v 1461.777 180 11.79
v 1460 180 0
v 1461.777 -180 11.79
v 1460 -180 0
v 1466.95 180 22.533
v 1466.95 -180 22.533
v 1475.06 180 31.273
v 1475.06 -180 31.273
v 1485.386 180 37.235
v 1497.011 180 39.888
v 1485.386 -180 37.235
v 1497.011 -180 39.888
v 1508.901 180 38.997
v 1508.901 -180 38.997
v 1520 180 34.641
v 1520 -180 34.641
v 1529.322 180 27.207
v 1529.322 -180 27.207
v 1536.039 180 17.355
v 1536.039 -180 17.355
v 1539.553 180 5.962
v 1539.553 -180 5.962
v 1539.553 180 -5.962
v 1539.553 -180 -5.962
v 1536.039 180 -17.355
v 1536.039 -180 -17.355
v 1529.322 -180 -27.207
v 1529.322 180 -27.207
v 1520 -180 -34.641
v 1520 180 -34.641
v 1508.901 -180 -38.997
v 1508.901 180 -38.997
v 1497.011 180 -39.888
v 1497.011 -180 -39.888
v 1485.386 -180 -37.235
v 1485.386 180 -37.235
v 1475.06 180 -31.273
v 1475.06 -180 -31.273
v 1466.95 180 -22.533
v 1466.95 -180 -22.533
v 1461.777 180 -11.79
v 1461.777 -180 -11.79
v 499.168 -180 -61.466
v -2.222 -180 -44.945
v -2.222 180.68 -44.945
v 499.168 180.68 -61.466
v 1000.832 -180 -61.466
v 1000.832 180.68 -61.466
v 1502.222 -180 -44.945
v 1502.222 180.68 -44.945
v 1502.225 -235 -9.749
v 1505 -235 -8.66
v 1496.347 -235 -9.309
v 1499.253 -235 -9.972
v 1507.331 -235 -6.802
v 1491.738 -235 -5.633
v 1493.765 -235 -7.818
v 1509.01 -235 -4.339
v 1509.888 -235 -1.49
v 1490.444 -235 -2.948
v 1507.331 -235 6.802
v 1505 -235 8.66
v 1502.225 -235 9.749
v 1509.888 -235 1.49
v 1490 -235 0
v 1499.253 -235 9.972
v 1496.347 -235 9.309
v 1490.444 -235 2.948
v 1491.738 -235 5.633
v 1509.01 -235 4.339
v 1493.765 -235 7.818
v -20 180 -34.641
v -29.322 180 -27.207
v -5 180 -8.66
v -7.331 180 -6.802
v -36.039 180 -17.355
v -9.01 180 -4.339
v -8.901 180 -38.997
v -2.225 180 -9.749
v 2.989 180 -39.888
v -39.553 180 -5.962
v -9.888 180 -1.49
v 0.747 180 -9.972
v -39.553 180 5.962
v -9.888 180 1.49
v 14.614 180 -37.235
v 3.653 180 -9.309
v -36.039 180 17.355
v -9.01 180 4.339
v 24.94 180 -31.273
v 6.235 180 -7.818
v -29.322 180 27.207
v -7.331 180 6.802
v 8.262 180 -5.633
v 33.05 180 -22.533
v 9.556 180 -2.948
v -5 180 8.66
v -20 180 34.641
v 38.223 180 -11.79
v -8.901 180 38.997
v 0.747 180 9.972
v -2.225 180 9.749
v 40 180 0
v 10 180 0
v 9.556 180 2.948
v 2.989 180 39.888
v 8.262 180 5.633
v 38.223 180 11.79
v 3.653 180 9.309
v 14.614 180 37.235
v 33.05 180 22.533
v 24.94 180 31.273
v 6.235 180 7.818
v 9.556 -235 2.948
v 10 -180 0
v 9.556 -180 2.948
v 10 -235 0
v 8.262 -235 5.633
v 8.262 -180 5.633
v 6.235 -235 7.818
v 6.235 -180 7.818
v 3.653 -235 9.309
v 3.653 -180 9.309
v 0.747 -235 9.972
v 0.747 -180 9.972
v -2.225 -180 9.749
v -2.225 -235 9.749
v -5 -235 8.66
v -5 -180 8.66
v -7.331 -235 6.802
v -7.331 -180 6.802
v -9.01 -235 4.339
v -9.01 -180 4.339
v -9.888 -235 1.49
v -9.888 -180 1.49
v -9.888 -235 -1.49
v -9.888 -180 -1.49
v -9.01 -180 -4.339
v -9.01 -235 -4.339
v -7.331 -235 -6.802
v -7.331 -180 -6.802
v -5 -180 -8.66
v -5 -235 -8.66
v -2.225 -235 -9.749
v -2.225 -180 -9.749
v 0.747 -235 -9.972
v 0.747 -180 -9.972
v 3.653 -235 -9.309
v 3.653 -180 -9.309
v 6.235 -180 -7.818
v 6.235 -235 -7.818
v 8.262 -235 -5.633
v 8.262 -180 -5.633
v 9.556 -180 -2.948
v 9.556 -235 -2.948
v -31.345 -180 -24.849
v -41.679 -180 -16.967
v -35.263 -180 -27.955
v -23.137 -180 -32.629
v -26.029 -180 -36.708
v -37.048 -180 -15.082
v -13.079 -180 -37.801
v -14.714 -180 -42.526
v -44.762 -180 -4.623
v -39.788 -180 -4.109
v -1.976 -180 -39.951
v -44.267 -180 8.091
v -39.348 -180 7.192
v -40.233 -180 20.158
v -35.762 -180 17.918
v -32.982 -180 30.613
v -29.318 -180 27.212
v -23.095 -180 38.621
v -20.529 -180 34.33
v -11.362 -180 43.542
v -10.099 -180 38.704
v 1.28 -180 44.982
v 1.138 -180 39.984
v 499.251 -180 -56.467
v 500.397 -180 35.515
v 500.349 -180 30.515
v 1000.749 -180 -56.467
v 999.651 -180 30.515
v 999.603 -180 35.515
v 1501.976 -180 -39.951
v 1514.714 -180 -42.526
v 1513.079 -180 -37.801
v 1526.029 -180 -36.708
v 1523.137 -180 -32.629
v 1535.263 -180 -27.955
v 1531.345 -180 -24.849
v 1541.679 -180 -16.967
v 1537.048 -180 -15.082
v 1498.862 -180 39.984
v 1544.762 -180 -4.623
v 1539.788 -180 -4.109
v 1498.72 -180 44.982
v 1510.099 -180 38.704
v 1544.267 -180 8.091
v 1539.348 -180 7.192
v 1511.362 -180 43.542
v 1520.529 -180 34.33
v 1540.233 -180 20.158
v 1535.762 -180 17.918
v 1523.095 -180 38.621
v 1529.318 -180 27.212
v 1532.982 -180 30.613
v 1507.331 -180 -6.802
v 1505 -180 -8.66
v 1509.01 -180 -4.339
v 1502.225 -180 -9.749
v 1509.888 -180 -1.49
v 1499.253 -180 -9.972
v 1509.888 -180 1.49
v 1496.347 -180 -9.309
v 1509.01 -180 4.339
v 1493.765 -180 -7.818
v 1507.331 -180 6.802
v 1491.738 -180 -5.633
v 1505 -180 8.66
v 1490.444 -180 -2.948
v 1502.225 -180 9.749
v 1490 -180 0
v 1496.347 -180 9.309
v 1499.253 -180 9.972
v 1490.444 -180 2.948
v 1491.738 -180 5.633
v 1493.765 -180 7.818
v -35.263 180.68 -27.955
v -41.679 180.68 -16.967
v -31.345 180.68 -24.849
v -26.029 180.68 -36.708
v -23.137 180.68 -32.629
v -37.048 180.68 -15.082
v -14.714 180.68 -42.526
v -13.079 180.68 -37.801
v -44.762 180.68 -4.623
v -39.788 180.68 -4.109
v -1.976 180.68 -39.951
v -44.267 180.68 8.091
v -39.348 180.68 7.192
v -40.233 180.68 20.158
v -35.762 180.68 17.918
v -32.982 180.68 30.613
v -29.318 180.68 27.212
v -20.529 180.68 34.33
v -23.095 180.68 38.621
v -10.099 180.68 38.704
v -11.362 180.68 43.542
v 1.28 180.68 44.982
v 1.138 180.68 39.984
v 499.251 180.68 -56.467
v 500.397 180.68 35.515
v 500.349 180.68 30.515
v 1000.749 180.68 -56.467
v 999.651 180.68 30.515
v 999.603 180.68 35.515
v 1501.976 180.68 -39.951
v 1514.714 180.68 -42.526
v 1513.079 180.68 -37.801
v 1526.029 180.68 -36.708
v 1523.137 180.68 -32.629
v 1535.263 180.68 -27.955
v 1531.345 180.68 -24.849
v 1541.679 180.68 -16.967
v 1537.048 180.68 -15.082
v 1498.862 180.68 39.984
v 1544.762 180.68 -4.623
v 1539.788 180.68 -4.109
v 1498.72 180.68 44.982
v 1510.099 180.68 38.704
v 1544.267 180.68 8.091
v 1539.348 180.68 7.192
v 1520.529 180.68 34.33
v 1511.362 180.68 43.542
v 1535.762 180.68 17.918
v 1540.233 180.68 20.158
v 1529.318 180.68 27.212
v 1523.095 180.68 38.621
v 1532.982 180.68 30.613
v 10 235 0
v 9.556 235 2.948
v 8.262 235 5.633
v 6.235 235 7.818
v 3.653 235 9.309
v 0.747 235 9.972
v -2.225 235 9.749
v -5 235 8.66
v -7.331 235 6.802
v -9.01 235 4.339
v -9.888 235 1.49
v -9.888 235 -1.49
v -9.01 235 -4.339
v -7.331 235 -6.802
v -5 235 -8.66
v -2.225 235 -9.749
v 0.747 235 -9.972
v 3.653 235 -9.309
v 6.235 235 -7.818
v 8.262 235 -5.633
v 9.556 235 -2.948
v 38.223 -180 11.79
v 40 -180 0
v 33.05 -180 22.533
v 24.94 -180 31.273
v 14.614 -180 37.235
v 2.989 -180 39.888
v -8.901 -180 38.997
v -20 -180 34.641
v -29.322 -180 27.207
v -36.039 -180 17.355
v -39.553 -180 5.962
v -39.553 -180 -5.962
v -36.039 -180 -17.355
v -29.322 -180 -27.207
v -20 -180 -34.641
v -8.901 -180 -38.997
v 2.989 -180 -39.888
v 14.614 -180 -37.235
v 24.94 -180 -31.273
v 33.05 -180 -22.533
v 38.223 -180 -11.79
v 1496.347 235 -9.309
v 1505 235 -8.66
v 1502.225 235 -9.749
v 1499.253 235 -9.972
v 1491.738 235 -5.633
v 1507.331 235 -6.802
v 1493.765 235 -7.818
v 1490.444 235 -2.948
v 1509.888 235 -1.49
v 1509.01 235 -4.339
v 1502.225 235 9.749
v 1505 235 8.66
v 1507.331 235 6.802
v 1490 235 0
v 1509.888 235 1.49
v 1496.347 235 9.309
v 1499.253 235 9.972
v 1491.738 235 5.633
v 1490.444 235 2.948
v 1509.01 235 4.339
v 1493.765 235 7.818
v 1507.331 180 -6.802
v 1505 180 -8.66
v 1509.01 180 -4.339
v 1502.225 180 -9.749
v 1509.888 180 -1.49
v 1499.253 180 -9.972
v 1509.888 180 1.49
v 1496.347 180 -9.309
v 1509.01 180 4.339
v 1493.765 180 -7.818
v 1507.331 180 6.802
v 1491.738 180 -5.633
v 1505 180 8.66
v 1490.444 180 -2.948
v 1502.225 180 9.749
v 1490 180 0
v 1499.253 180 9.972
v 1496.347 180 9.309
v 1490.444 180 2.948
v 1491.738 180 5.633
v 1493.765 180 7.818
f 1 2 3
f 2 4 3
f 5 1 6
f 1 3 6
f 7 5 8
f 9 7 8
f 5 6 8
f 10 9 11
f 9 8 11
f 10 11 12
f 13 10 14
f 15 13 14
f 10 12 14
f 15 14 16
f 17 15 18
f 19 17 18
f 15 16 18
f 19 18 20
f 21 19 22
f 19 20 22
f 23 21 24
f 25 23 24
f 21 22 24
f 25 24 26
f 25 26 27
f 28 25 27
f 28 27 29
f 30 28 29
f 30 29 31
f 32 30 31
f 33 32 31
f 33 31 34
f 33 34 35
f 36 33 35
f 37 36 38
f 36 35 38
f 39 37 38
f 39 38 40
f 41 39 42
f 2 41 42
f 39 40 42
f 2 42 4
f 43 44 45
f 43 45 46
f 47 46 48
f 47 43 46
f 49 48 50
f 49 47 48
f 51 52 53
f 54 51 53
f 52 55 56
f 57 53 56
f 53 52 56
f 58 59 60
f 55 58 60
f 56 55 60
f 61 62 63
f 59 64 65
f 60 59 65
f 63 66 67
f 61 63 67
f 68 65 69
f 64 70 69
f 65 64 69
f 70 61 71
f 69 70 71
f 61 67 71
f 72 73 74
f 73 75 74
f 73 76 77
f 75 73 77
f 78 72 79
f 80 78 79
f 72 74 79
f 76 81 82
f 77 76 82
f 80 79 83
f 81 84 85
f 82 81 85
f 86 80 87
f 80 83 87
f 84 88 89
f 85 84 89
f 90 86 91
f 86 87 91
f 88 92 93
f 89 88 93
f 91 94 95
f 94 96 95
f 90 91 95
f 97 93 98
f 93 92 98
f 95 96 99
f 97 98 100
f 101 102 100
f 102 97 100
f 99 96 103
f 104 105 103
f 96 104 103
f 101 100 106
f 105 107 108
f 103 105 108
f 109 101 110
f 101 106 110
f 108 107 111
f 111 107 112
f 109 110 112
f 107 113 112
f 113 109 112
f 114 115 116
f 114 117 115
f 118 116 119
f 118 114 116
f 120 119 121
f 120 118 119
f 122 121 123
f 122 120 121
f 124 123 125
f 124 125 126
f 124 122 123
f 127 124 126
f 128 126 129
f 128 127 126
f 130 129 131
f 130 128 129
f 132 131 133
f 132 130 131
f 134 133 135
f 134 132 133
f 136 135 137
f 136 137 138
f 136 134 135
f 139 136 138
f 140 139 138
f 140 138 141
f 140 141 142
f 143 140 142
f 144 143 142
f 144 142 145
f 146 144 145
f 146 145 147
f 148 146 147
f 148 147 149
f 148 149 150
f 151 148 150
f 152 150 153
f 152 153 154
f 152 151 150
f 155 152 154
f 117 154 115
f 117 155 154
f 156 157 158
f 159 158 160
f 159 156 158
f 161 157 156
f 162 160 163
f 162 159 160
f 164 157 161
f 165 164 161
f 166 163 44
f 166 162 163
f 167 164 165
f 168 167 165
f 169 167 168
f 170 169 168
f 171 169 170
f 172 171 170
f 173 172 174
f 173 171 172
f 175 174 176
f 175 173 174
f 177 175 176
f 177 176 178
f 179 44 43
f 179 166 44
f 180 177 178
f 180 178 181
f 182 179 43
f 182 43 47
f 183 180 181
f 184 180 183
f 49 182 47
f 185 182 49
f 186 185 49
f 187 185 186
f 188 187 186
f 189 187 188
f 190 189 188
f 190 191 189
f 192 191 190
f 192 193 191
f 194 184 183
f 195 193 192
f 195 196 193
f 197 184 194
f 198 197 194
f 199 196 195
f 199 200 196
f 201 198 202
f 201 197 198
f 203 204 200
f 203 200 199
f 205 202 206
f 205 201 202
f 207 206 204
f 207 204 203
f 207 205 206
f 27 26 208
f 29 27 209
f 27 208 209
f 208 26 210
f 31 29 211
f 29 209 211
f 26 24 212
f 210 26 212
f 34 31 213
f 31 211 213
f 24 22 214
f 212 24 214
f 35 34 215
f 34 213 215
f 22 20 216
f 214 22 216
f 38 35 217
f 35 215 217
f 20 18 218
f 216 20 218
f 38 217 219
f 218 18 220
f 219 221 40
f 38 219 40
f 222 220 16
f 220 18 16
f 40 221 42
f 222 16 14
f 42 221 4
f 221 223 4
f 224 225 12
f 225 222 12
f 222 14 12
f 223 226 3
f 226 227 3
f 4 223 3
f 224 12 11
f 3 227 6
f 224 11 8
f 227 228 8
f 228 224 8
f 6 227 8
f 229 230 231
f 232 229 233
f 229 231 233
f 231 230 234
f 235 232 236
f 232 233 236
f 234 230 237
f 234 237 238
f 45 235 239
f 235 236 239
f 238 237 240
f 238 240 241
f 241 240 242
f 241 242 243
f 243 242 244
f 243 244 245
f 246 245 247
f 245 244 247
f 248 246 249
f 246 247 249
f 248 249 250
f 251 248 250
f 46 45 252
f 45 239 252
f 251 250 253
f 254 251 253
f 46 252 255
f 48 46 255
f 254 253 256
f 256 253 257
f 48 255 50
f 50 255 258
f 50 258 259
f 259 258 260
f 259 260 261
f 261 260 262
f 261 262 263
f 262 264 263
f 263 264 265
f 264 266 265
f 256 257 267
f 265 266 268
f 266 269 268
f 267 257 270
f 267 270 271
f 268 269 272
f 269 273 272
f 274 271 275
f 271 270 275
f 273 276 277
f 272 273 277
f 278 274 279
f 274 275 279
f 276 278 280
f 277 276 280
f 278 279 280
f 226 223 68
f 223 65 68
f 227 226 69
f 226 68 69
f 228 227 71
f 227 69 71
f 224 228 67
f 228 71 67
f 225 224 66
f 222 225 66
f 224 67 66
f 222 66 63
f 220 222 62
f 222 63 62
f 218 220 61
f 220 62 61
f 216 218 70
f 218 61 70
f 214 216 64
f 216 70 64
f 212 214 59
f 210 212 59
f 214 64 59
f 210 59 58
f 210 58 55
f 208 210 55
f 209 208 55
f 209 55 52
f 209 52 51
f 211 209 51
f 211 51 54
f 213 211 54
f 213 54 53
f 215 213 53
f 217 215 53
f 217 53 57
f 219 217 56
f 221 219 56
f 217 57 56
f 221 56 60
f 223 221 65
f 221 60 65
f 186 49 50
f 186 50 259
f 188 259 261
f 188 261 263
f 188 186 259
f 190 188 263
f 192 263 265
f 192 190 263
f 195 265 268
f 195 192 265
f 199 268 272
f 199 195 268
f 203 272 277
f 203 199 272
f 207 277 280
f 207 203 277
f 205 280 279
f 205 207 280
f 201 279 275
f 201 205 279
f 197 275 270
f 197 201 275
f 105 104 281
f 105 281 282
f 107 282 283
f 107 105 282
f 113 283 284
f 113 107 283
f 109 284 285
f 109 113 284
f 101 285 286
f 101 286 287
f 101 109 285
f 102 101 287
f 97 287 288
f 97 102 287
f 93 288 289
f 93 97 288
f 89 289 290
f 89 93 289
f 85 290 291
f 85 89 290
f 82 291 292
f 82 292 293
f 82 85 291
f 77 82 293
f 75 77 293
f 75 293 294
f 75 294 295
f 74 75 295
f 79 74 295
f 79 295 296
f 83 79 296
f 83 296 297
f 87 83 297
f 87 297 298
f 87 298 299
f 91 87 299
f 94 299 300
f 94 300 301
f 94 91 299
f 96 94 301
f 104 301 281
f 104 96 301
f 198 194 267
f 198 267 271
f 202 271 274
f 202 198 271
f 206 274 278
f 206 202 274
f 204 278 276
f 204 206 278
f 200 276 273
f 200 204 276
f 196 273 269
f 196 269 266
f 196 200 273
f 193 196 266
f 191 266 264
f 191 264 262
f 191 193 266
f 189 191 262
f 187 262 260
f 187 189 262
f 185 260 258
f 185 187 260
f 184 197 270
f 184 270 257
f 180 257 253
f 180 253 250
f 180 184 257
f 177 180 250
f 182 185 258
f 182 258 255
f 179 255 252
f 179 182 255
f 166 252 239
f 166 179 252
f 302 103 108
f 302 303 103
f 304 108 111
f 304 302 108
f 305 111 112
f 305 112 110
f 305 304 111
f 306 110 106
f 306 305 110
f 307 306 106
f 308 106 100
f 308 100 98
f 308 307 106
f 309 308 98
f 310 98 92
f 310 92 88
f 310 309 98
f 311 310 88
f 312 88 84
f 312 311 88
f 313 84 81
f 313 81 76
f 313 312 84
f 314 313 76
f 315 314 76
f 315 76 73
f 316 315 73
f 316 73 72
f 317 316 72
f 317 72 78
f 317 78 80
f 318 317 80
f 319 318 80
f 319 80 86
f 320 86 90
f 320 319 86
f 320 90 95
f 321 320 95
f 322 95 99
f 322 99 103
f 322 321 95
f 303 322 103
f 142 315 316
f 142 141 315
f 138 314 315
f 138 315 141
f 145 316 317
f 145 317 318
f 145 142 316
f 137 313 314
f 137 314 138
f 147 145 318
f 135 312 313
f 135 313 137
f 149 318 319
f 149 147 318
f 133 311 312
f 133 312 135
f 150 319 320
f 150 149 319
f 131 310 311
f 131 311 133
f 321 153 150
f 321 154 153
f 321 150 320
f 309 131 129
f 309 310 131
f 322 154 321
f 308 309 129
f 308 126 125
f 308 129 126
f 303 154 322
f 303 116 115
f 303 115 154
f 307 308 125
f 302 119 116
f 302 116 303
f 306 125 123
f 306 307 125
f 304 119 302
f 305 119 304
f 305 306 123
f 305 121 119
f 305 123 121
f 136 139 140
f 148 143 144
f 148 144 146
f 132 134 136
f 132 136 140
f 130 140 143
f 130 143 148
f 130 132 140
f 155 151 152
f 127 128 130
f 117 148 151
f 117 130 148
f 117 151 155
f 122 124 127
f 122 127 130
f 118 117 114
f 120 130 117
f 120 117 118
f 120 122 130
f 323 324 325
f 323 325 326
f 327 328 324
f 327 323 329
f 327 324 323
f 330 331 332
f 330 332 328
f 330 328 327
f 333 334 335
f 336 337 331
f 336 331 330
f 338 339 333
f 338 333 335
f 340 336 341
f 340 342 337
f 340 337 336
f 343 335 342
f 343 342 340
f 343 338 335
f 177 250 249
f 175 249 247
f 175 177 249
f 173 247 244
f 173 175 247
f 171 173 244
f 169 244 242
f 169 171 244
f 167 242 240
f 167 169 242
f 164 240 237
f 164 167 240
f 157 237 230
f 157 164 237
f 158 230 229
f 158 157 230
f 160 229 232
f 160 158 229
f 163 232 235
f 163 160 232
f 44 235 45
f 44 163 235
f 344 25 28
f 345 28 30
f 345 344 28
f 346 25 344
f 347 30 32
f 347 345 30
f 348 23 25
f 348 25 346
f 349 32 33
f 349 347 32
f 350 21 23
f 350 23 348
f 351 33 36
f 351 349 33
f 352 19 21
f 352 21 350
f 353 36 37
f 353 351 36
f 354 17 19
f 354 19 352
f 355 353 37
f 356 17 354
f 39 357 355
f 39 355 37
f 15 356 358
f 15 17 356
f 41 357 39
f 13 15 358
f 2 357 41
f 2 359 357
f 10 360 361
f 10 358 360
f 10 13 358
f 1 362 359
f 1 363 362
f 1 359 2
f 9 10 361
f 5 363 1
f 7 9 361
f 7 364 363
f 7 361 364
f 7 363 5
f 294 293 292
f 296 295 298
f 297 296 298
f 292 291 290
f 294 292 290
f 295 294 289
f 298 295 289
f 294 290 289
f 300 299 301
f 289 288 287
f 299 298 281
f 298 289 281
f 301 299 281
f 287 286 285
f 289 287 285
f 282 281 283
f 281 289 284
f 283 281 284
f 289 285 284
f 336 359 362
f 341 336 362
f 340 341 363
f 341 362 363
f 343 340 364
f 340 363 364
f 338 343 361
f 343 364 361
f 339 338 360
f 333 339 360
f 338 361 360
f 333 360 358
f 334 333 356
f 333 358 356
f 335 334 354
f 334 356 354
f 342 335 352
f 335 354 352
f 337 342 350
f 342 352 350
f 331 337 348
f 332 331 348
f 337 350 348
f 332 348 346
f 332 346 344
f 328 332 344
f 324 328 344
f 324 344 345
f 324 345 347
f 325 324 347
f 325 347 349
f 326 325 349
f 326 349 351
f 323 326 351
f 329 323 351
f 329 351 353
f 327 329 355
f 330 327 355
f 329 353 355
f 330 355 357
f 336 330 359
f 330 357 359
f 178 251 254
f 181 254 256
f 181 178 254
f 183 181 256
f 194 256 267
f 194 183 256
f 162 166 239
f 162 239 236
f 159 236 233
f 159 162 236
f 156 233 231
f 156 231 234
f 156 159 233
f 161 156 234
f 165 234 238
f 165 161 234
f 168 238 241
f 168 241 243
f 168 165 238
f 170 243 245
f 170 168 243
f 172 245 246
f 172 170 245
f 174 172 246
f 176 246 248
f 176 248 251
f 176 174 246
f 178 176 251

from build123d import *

# Parameters (mm, degrees)
F0_R     = 10
F1_DEPTH = 235
F2_R     = 40
F3_DEPTH = 180
F8_DEPTH = 360.68


with BuildPart() as f1:
    # F0 (on Front) → F1 (new body, symmetric)
    with BuildSketch(Plane.XZ):
        Circle(F0_R)
    extrude(amount=F1_DEPTH, both=True)

    # F2 (on Front) → F3 (join, symmetric)
    with BuildSketch(Plane.XZ):
        Circle(F2_R)
    extrude(amount=F3_DEPTH, both=True)


with BuildPart() as f5_1:
    # F5: instance of F1
    add(f1.part.mirror(Plane.YZ.offset(750)))


with BuildPart() as f8:
    # F7 (on offset) → F8 (new body)
    with BuildSketch(Plane.XZ.offset(180)):
        with BuildLine():
            ThreePointArc((1498.720032, 44.981793), (750, 34.331439), (1.279968, 44.981793))
            ThreePointArc((1.279968, 44.981793), (-44.965908, 1.751315), (-2.222469, -44.945085))
            ThreePointArc((-2.222469, -44.945085), (750, -63.531883), (1502.222469, -44.945085))
            ThreePointArc((1502.222469, -44.945085), (1544.965908, 1.751315), (1498.720032, 44.981793))
        make_face()
        with BuildLine():
            ThreePointArc((-1.975528, -39.951186), (-39.969696, 1.556724), (1.13775, 39.983816))
            ThreePointArc((1.13775, 39.983816), (750, 29.331439), (1498.86225, 39.983816))
            ThreePointArc((1498.86225, 39.983816), (1539.969696, 1.556724), (1501.975528, -39.951186))
            ThreePointArc((1501.975528, -39.951186), (750, -58.531883), (-1.975528, -39.951186))
        make_face(mode=Mode.SUBTRACT)
    extrude(amount=-F8_DEPTH)


solid = Compound([f1.part, f5_1.part, f8.part])
